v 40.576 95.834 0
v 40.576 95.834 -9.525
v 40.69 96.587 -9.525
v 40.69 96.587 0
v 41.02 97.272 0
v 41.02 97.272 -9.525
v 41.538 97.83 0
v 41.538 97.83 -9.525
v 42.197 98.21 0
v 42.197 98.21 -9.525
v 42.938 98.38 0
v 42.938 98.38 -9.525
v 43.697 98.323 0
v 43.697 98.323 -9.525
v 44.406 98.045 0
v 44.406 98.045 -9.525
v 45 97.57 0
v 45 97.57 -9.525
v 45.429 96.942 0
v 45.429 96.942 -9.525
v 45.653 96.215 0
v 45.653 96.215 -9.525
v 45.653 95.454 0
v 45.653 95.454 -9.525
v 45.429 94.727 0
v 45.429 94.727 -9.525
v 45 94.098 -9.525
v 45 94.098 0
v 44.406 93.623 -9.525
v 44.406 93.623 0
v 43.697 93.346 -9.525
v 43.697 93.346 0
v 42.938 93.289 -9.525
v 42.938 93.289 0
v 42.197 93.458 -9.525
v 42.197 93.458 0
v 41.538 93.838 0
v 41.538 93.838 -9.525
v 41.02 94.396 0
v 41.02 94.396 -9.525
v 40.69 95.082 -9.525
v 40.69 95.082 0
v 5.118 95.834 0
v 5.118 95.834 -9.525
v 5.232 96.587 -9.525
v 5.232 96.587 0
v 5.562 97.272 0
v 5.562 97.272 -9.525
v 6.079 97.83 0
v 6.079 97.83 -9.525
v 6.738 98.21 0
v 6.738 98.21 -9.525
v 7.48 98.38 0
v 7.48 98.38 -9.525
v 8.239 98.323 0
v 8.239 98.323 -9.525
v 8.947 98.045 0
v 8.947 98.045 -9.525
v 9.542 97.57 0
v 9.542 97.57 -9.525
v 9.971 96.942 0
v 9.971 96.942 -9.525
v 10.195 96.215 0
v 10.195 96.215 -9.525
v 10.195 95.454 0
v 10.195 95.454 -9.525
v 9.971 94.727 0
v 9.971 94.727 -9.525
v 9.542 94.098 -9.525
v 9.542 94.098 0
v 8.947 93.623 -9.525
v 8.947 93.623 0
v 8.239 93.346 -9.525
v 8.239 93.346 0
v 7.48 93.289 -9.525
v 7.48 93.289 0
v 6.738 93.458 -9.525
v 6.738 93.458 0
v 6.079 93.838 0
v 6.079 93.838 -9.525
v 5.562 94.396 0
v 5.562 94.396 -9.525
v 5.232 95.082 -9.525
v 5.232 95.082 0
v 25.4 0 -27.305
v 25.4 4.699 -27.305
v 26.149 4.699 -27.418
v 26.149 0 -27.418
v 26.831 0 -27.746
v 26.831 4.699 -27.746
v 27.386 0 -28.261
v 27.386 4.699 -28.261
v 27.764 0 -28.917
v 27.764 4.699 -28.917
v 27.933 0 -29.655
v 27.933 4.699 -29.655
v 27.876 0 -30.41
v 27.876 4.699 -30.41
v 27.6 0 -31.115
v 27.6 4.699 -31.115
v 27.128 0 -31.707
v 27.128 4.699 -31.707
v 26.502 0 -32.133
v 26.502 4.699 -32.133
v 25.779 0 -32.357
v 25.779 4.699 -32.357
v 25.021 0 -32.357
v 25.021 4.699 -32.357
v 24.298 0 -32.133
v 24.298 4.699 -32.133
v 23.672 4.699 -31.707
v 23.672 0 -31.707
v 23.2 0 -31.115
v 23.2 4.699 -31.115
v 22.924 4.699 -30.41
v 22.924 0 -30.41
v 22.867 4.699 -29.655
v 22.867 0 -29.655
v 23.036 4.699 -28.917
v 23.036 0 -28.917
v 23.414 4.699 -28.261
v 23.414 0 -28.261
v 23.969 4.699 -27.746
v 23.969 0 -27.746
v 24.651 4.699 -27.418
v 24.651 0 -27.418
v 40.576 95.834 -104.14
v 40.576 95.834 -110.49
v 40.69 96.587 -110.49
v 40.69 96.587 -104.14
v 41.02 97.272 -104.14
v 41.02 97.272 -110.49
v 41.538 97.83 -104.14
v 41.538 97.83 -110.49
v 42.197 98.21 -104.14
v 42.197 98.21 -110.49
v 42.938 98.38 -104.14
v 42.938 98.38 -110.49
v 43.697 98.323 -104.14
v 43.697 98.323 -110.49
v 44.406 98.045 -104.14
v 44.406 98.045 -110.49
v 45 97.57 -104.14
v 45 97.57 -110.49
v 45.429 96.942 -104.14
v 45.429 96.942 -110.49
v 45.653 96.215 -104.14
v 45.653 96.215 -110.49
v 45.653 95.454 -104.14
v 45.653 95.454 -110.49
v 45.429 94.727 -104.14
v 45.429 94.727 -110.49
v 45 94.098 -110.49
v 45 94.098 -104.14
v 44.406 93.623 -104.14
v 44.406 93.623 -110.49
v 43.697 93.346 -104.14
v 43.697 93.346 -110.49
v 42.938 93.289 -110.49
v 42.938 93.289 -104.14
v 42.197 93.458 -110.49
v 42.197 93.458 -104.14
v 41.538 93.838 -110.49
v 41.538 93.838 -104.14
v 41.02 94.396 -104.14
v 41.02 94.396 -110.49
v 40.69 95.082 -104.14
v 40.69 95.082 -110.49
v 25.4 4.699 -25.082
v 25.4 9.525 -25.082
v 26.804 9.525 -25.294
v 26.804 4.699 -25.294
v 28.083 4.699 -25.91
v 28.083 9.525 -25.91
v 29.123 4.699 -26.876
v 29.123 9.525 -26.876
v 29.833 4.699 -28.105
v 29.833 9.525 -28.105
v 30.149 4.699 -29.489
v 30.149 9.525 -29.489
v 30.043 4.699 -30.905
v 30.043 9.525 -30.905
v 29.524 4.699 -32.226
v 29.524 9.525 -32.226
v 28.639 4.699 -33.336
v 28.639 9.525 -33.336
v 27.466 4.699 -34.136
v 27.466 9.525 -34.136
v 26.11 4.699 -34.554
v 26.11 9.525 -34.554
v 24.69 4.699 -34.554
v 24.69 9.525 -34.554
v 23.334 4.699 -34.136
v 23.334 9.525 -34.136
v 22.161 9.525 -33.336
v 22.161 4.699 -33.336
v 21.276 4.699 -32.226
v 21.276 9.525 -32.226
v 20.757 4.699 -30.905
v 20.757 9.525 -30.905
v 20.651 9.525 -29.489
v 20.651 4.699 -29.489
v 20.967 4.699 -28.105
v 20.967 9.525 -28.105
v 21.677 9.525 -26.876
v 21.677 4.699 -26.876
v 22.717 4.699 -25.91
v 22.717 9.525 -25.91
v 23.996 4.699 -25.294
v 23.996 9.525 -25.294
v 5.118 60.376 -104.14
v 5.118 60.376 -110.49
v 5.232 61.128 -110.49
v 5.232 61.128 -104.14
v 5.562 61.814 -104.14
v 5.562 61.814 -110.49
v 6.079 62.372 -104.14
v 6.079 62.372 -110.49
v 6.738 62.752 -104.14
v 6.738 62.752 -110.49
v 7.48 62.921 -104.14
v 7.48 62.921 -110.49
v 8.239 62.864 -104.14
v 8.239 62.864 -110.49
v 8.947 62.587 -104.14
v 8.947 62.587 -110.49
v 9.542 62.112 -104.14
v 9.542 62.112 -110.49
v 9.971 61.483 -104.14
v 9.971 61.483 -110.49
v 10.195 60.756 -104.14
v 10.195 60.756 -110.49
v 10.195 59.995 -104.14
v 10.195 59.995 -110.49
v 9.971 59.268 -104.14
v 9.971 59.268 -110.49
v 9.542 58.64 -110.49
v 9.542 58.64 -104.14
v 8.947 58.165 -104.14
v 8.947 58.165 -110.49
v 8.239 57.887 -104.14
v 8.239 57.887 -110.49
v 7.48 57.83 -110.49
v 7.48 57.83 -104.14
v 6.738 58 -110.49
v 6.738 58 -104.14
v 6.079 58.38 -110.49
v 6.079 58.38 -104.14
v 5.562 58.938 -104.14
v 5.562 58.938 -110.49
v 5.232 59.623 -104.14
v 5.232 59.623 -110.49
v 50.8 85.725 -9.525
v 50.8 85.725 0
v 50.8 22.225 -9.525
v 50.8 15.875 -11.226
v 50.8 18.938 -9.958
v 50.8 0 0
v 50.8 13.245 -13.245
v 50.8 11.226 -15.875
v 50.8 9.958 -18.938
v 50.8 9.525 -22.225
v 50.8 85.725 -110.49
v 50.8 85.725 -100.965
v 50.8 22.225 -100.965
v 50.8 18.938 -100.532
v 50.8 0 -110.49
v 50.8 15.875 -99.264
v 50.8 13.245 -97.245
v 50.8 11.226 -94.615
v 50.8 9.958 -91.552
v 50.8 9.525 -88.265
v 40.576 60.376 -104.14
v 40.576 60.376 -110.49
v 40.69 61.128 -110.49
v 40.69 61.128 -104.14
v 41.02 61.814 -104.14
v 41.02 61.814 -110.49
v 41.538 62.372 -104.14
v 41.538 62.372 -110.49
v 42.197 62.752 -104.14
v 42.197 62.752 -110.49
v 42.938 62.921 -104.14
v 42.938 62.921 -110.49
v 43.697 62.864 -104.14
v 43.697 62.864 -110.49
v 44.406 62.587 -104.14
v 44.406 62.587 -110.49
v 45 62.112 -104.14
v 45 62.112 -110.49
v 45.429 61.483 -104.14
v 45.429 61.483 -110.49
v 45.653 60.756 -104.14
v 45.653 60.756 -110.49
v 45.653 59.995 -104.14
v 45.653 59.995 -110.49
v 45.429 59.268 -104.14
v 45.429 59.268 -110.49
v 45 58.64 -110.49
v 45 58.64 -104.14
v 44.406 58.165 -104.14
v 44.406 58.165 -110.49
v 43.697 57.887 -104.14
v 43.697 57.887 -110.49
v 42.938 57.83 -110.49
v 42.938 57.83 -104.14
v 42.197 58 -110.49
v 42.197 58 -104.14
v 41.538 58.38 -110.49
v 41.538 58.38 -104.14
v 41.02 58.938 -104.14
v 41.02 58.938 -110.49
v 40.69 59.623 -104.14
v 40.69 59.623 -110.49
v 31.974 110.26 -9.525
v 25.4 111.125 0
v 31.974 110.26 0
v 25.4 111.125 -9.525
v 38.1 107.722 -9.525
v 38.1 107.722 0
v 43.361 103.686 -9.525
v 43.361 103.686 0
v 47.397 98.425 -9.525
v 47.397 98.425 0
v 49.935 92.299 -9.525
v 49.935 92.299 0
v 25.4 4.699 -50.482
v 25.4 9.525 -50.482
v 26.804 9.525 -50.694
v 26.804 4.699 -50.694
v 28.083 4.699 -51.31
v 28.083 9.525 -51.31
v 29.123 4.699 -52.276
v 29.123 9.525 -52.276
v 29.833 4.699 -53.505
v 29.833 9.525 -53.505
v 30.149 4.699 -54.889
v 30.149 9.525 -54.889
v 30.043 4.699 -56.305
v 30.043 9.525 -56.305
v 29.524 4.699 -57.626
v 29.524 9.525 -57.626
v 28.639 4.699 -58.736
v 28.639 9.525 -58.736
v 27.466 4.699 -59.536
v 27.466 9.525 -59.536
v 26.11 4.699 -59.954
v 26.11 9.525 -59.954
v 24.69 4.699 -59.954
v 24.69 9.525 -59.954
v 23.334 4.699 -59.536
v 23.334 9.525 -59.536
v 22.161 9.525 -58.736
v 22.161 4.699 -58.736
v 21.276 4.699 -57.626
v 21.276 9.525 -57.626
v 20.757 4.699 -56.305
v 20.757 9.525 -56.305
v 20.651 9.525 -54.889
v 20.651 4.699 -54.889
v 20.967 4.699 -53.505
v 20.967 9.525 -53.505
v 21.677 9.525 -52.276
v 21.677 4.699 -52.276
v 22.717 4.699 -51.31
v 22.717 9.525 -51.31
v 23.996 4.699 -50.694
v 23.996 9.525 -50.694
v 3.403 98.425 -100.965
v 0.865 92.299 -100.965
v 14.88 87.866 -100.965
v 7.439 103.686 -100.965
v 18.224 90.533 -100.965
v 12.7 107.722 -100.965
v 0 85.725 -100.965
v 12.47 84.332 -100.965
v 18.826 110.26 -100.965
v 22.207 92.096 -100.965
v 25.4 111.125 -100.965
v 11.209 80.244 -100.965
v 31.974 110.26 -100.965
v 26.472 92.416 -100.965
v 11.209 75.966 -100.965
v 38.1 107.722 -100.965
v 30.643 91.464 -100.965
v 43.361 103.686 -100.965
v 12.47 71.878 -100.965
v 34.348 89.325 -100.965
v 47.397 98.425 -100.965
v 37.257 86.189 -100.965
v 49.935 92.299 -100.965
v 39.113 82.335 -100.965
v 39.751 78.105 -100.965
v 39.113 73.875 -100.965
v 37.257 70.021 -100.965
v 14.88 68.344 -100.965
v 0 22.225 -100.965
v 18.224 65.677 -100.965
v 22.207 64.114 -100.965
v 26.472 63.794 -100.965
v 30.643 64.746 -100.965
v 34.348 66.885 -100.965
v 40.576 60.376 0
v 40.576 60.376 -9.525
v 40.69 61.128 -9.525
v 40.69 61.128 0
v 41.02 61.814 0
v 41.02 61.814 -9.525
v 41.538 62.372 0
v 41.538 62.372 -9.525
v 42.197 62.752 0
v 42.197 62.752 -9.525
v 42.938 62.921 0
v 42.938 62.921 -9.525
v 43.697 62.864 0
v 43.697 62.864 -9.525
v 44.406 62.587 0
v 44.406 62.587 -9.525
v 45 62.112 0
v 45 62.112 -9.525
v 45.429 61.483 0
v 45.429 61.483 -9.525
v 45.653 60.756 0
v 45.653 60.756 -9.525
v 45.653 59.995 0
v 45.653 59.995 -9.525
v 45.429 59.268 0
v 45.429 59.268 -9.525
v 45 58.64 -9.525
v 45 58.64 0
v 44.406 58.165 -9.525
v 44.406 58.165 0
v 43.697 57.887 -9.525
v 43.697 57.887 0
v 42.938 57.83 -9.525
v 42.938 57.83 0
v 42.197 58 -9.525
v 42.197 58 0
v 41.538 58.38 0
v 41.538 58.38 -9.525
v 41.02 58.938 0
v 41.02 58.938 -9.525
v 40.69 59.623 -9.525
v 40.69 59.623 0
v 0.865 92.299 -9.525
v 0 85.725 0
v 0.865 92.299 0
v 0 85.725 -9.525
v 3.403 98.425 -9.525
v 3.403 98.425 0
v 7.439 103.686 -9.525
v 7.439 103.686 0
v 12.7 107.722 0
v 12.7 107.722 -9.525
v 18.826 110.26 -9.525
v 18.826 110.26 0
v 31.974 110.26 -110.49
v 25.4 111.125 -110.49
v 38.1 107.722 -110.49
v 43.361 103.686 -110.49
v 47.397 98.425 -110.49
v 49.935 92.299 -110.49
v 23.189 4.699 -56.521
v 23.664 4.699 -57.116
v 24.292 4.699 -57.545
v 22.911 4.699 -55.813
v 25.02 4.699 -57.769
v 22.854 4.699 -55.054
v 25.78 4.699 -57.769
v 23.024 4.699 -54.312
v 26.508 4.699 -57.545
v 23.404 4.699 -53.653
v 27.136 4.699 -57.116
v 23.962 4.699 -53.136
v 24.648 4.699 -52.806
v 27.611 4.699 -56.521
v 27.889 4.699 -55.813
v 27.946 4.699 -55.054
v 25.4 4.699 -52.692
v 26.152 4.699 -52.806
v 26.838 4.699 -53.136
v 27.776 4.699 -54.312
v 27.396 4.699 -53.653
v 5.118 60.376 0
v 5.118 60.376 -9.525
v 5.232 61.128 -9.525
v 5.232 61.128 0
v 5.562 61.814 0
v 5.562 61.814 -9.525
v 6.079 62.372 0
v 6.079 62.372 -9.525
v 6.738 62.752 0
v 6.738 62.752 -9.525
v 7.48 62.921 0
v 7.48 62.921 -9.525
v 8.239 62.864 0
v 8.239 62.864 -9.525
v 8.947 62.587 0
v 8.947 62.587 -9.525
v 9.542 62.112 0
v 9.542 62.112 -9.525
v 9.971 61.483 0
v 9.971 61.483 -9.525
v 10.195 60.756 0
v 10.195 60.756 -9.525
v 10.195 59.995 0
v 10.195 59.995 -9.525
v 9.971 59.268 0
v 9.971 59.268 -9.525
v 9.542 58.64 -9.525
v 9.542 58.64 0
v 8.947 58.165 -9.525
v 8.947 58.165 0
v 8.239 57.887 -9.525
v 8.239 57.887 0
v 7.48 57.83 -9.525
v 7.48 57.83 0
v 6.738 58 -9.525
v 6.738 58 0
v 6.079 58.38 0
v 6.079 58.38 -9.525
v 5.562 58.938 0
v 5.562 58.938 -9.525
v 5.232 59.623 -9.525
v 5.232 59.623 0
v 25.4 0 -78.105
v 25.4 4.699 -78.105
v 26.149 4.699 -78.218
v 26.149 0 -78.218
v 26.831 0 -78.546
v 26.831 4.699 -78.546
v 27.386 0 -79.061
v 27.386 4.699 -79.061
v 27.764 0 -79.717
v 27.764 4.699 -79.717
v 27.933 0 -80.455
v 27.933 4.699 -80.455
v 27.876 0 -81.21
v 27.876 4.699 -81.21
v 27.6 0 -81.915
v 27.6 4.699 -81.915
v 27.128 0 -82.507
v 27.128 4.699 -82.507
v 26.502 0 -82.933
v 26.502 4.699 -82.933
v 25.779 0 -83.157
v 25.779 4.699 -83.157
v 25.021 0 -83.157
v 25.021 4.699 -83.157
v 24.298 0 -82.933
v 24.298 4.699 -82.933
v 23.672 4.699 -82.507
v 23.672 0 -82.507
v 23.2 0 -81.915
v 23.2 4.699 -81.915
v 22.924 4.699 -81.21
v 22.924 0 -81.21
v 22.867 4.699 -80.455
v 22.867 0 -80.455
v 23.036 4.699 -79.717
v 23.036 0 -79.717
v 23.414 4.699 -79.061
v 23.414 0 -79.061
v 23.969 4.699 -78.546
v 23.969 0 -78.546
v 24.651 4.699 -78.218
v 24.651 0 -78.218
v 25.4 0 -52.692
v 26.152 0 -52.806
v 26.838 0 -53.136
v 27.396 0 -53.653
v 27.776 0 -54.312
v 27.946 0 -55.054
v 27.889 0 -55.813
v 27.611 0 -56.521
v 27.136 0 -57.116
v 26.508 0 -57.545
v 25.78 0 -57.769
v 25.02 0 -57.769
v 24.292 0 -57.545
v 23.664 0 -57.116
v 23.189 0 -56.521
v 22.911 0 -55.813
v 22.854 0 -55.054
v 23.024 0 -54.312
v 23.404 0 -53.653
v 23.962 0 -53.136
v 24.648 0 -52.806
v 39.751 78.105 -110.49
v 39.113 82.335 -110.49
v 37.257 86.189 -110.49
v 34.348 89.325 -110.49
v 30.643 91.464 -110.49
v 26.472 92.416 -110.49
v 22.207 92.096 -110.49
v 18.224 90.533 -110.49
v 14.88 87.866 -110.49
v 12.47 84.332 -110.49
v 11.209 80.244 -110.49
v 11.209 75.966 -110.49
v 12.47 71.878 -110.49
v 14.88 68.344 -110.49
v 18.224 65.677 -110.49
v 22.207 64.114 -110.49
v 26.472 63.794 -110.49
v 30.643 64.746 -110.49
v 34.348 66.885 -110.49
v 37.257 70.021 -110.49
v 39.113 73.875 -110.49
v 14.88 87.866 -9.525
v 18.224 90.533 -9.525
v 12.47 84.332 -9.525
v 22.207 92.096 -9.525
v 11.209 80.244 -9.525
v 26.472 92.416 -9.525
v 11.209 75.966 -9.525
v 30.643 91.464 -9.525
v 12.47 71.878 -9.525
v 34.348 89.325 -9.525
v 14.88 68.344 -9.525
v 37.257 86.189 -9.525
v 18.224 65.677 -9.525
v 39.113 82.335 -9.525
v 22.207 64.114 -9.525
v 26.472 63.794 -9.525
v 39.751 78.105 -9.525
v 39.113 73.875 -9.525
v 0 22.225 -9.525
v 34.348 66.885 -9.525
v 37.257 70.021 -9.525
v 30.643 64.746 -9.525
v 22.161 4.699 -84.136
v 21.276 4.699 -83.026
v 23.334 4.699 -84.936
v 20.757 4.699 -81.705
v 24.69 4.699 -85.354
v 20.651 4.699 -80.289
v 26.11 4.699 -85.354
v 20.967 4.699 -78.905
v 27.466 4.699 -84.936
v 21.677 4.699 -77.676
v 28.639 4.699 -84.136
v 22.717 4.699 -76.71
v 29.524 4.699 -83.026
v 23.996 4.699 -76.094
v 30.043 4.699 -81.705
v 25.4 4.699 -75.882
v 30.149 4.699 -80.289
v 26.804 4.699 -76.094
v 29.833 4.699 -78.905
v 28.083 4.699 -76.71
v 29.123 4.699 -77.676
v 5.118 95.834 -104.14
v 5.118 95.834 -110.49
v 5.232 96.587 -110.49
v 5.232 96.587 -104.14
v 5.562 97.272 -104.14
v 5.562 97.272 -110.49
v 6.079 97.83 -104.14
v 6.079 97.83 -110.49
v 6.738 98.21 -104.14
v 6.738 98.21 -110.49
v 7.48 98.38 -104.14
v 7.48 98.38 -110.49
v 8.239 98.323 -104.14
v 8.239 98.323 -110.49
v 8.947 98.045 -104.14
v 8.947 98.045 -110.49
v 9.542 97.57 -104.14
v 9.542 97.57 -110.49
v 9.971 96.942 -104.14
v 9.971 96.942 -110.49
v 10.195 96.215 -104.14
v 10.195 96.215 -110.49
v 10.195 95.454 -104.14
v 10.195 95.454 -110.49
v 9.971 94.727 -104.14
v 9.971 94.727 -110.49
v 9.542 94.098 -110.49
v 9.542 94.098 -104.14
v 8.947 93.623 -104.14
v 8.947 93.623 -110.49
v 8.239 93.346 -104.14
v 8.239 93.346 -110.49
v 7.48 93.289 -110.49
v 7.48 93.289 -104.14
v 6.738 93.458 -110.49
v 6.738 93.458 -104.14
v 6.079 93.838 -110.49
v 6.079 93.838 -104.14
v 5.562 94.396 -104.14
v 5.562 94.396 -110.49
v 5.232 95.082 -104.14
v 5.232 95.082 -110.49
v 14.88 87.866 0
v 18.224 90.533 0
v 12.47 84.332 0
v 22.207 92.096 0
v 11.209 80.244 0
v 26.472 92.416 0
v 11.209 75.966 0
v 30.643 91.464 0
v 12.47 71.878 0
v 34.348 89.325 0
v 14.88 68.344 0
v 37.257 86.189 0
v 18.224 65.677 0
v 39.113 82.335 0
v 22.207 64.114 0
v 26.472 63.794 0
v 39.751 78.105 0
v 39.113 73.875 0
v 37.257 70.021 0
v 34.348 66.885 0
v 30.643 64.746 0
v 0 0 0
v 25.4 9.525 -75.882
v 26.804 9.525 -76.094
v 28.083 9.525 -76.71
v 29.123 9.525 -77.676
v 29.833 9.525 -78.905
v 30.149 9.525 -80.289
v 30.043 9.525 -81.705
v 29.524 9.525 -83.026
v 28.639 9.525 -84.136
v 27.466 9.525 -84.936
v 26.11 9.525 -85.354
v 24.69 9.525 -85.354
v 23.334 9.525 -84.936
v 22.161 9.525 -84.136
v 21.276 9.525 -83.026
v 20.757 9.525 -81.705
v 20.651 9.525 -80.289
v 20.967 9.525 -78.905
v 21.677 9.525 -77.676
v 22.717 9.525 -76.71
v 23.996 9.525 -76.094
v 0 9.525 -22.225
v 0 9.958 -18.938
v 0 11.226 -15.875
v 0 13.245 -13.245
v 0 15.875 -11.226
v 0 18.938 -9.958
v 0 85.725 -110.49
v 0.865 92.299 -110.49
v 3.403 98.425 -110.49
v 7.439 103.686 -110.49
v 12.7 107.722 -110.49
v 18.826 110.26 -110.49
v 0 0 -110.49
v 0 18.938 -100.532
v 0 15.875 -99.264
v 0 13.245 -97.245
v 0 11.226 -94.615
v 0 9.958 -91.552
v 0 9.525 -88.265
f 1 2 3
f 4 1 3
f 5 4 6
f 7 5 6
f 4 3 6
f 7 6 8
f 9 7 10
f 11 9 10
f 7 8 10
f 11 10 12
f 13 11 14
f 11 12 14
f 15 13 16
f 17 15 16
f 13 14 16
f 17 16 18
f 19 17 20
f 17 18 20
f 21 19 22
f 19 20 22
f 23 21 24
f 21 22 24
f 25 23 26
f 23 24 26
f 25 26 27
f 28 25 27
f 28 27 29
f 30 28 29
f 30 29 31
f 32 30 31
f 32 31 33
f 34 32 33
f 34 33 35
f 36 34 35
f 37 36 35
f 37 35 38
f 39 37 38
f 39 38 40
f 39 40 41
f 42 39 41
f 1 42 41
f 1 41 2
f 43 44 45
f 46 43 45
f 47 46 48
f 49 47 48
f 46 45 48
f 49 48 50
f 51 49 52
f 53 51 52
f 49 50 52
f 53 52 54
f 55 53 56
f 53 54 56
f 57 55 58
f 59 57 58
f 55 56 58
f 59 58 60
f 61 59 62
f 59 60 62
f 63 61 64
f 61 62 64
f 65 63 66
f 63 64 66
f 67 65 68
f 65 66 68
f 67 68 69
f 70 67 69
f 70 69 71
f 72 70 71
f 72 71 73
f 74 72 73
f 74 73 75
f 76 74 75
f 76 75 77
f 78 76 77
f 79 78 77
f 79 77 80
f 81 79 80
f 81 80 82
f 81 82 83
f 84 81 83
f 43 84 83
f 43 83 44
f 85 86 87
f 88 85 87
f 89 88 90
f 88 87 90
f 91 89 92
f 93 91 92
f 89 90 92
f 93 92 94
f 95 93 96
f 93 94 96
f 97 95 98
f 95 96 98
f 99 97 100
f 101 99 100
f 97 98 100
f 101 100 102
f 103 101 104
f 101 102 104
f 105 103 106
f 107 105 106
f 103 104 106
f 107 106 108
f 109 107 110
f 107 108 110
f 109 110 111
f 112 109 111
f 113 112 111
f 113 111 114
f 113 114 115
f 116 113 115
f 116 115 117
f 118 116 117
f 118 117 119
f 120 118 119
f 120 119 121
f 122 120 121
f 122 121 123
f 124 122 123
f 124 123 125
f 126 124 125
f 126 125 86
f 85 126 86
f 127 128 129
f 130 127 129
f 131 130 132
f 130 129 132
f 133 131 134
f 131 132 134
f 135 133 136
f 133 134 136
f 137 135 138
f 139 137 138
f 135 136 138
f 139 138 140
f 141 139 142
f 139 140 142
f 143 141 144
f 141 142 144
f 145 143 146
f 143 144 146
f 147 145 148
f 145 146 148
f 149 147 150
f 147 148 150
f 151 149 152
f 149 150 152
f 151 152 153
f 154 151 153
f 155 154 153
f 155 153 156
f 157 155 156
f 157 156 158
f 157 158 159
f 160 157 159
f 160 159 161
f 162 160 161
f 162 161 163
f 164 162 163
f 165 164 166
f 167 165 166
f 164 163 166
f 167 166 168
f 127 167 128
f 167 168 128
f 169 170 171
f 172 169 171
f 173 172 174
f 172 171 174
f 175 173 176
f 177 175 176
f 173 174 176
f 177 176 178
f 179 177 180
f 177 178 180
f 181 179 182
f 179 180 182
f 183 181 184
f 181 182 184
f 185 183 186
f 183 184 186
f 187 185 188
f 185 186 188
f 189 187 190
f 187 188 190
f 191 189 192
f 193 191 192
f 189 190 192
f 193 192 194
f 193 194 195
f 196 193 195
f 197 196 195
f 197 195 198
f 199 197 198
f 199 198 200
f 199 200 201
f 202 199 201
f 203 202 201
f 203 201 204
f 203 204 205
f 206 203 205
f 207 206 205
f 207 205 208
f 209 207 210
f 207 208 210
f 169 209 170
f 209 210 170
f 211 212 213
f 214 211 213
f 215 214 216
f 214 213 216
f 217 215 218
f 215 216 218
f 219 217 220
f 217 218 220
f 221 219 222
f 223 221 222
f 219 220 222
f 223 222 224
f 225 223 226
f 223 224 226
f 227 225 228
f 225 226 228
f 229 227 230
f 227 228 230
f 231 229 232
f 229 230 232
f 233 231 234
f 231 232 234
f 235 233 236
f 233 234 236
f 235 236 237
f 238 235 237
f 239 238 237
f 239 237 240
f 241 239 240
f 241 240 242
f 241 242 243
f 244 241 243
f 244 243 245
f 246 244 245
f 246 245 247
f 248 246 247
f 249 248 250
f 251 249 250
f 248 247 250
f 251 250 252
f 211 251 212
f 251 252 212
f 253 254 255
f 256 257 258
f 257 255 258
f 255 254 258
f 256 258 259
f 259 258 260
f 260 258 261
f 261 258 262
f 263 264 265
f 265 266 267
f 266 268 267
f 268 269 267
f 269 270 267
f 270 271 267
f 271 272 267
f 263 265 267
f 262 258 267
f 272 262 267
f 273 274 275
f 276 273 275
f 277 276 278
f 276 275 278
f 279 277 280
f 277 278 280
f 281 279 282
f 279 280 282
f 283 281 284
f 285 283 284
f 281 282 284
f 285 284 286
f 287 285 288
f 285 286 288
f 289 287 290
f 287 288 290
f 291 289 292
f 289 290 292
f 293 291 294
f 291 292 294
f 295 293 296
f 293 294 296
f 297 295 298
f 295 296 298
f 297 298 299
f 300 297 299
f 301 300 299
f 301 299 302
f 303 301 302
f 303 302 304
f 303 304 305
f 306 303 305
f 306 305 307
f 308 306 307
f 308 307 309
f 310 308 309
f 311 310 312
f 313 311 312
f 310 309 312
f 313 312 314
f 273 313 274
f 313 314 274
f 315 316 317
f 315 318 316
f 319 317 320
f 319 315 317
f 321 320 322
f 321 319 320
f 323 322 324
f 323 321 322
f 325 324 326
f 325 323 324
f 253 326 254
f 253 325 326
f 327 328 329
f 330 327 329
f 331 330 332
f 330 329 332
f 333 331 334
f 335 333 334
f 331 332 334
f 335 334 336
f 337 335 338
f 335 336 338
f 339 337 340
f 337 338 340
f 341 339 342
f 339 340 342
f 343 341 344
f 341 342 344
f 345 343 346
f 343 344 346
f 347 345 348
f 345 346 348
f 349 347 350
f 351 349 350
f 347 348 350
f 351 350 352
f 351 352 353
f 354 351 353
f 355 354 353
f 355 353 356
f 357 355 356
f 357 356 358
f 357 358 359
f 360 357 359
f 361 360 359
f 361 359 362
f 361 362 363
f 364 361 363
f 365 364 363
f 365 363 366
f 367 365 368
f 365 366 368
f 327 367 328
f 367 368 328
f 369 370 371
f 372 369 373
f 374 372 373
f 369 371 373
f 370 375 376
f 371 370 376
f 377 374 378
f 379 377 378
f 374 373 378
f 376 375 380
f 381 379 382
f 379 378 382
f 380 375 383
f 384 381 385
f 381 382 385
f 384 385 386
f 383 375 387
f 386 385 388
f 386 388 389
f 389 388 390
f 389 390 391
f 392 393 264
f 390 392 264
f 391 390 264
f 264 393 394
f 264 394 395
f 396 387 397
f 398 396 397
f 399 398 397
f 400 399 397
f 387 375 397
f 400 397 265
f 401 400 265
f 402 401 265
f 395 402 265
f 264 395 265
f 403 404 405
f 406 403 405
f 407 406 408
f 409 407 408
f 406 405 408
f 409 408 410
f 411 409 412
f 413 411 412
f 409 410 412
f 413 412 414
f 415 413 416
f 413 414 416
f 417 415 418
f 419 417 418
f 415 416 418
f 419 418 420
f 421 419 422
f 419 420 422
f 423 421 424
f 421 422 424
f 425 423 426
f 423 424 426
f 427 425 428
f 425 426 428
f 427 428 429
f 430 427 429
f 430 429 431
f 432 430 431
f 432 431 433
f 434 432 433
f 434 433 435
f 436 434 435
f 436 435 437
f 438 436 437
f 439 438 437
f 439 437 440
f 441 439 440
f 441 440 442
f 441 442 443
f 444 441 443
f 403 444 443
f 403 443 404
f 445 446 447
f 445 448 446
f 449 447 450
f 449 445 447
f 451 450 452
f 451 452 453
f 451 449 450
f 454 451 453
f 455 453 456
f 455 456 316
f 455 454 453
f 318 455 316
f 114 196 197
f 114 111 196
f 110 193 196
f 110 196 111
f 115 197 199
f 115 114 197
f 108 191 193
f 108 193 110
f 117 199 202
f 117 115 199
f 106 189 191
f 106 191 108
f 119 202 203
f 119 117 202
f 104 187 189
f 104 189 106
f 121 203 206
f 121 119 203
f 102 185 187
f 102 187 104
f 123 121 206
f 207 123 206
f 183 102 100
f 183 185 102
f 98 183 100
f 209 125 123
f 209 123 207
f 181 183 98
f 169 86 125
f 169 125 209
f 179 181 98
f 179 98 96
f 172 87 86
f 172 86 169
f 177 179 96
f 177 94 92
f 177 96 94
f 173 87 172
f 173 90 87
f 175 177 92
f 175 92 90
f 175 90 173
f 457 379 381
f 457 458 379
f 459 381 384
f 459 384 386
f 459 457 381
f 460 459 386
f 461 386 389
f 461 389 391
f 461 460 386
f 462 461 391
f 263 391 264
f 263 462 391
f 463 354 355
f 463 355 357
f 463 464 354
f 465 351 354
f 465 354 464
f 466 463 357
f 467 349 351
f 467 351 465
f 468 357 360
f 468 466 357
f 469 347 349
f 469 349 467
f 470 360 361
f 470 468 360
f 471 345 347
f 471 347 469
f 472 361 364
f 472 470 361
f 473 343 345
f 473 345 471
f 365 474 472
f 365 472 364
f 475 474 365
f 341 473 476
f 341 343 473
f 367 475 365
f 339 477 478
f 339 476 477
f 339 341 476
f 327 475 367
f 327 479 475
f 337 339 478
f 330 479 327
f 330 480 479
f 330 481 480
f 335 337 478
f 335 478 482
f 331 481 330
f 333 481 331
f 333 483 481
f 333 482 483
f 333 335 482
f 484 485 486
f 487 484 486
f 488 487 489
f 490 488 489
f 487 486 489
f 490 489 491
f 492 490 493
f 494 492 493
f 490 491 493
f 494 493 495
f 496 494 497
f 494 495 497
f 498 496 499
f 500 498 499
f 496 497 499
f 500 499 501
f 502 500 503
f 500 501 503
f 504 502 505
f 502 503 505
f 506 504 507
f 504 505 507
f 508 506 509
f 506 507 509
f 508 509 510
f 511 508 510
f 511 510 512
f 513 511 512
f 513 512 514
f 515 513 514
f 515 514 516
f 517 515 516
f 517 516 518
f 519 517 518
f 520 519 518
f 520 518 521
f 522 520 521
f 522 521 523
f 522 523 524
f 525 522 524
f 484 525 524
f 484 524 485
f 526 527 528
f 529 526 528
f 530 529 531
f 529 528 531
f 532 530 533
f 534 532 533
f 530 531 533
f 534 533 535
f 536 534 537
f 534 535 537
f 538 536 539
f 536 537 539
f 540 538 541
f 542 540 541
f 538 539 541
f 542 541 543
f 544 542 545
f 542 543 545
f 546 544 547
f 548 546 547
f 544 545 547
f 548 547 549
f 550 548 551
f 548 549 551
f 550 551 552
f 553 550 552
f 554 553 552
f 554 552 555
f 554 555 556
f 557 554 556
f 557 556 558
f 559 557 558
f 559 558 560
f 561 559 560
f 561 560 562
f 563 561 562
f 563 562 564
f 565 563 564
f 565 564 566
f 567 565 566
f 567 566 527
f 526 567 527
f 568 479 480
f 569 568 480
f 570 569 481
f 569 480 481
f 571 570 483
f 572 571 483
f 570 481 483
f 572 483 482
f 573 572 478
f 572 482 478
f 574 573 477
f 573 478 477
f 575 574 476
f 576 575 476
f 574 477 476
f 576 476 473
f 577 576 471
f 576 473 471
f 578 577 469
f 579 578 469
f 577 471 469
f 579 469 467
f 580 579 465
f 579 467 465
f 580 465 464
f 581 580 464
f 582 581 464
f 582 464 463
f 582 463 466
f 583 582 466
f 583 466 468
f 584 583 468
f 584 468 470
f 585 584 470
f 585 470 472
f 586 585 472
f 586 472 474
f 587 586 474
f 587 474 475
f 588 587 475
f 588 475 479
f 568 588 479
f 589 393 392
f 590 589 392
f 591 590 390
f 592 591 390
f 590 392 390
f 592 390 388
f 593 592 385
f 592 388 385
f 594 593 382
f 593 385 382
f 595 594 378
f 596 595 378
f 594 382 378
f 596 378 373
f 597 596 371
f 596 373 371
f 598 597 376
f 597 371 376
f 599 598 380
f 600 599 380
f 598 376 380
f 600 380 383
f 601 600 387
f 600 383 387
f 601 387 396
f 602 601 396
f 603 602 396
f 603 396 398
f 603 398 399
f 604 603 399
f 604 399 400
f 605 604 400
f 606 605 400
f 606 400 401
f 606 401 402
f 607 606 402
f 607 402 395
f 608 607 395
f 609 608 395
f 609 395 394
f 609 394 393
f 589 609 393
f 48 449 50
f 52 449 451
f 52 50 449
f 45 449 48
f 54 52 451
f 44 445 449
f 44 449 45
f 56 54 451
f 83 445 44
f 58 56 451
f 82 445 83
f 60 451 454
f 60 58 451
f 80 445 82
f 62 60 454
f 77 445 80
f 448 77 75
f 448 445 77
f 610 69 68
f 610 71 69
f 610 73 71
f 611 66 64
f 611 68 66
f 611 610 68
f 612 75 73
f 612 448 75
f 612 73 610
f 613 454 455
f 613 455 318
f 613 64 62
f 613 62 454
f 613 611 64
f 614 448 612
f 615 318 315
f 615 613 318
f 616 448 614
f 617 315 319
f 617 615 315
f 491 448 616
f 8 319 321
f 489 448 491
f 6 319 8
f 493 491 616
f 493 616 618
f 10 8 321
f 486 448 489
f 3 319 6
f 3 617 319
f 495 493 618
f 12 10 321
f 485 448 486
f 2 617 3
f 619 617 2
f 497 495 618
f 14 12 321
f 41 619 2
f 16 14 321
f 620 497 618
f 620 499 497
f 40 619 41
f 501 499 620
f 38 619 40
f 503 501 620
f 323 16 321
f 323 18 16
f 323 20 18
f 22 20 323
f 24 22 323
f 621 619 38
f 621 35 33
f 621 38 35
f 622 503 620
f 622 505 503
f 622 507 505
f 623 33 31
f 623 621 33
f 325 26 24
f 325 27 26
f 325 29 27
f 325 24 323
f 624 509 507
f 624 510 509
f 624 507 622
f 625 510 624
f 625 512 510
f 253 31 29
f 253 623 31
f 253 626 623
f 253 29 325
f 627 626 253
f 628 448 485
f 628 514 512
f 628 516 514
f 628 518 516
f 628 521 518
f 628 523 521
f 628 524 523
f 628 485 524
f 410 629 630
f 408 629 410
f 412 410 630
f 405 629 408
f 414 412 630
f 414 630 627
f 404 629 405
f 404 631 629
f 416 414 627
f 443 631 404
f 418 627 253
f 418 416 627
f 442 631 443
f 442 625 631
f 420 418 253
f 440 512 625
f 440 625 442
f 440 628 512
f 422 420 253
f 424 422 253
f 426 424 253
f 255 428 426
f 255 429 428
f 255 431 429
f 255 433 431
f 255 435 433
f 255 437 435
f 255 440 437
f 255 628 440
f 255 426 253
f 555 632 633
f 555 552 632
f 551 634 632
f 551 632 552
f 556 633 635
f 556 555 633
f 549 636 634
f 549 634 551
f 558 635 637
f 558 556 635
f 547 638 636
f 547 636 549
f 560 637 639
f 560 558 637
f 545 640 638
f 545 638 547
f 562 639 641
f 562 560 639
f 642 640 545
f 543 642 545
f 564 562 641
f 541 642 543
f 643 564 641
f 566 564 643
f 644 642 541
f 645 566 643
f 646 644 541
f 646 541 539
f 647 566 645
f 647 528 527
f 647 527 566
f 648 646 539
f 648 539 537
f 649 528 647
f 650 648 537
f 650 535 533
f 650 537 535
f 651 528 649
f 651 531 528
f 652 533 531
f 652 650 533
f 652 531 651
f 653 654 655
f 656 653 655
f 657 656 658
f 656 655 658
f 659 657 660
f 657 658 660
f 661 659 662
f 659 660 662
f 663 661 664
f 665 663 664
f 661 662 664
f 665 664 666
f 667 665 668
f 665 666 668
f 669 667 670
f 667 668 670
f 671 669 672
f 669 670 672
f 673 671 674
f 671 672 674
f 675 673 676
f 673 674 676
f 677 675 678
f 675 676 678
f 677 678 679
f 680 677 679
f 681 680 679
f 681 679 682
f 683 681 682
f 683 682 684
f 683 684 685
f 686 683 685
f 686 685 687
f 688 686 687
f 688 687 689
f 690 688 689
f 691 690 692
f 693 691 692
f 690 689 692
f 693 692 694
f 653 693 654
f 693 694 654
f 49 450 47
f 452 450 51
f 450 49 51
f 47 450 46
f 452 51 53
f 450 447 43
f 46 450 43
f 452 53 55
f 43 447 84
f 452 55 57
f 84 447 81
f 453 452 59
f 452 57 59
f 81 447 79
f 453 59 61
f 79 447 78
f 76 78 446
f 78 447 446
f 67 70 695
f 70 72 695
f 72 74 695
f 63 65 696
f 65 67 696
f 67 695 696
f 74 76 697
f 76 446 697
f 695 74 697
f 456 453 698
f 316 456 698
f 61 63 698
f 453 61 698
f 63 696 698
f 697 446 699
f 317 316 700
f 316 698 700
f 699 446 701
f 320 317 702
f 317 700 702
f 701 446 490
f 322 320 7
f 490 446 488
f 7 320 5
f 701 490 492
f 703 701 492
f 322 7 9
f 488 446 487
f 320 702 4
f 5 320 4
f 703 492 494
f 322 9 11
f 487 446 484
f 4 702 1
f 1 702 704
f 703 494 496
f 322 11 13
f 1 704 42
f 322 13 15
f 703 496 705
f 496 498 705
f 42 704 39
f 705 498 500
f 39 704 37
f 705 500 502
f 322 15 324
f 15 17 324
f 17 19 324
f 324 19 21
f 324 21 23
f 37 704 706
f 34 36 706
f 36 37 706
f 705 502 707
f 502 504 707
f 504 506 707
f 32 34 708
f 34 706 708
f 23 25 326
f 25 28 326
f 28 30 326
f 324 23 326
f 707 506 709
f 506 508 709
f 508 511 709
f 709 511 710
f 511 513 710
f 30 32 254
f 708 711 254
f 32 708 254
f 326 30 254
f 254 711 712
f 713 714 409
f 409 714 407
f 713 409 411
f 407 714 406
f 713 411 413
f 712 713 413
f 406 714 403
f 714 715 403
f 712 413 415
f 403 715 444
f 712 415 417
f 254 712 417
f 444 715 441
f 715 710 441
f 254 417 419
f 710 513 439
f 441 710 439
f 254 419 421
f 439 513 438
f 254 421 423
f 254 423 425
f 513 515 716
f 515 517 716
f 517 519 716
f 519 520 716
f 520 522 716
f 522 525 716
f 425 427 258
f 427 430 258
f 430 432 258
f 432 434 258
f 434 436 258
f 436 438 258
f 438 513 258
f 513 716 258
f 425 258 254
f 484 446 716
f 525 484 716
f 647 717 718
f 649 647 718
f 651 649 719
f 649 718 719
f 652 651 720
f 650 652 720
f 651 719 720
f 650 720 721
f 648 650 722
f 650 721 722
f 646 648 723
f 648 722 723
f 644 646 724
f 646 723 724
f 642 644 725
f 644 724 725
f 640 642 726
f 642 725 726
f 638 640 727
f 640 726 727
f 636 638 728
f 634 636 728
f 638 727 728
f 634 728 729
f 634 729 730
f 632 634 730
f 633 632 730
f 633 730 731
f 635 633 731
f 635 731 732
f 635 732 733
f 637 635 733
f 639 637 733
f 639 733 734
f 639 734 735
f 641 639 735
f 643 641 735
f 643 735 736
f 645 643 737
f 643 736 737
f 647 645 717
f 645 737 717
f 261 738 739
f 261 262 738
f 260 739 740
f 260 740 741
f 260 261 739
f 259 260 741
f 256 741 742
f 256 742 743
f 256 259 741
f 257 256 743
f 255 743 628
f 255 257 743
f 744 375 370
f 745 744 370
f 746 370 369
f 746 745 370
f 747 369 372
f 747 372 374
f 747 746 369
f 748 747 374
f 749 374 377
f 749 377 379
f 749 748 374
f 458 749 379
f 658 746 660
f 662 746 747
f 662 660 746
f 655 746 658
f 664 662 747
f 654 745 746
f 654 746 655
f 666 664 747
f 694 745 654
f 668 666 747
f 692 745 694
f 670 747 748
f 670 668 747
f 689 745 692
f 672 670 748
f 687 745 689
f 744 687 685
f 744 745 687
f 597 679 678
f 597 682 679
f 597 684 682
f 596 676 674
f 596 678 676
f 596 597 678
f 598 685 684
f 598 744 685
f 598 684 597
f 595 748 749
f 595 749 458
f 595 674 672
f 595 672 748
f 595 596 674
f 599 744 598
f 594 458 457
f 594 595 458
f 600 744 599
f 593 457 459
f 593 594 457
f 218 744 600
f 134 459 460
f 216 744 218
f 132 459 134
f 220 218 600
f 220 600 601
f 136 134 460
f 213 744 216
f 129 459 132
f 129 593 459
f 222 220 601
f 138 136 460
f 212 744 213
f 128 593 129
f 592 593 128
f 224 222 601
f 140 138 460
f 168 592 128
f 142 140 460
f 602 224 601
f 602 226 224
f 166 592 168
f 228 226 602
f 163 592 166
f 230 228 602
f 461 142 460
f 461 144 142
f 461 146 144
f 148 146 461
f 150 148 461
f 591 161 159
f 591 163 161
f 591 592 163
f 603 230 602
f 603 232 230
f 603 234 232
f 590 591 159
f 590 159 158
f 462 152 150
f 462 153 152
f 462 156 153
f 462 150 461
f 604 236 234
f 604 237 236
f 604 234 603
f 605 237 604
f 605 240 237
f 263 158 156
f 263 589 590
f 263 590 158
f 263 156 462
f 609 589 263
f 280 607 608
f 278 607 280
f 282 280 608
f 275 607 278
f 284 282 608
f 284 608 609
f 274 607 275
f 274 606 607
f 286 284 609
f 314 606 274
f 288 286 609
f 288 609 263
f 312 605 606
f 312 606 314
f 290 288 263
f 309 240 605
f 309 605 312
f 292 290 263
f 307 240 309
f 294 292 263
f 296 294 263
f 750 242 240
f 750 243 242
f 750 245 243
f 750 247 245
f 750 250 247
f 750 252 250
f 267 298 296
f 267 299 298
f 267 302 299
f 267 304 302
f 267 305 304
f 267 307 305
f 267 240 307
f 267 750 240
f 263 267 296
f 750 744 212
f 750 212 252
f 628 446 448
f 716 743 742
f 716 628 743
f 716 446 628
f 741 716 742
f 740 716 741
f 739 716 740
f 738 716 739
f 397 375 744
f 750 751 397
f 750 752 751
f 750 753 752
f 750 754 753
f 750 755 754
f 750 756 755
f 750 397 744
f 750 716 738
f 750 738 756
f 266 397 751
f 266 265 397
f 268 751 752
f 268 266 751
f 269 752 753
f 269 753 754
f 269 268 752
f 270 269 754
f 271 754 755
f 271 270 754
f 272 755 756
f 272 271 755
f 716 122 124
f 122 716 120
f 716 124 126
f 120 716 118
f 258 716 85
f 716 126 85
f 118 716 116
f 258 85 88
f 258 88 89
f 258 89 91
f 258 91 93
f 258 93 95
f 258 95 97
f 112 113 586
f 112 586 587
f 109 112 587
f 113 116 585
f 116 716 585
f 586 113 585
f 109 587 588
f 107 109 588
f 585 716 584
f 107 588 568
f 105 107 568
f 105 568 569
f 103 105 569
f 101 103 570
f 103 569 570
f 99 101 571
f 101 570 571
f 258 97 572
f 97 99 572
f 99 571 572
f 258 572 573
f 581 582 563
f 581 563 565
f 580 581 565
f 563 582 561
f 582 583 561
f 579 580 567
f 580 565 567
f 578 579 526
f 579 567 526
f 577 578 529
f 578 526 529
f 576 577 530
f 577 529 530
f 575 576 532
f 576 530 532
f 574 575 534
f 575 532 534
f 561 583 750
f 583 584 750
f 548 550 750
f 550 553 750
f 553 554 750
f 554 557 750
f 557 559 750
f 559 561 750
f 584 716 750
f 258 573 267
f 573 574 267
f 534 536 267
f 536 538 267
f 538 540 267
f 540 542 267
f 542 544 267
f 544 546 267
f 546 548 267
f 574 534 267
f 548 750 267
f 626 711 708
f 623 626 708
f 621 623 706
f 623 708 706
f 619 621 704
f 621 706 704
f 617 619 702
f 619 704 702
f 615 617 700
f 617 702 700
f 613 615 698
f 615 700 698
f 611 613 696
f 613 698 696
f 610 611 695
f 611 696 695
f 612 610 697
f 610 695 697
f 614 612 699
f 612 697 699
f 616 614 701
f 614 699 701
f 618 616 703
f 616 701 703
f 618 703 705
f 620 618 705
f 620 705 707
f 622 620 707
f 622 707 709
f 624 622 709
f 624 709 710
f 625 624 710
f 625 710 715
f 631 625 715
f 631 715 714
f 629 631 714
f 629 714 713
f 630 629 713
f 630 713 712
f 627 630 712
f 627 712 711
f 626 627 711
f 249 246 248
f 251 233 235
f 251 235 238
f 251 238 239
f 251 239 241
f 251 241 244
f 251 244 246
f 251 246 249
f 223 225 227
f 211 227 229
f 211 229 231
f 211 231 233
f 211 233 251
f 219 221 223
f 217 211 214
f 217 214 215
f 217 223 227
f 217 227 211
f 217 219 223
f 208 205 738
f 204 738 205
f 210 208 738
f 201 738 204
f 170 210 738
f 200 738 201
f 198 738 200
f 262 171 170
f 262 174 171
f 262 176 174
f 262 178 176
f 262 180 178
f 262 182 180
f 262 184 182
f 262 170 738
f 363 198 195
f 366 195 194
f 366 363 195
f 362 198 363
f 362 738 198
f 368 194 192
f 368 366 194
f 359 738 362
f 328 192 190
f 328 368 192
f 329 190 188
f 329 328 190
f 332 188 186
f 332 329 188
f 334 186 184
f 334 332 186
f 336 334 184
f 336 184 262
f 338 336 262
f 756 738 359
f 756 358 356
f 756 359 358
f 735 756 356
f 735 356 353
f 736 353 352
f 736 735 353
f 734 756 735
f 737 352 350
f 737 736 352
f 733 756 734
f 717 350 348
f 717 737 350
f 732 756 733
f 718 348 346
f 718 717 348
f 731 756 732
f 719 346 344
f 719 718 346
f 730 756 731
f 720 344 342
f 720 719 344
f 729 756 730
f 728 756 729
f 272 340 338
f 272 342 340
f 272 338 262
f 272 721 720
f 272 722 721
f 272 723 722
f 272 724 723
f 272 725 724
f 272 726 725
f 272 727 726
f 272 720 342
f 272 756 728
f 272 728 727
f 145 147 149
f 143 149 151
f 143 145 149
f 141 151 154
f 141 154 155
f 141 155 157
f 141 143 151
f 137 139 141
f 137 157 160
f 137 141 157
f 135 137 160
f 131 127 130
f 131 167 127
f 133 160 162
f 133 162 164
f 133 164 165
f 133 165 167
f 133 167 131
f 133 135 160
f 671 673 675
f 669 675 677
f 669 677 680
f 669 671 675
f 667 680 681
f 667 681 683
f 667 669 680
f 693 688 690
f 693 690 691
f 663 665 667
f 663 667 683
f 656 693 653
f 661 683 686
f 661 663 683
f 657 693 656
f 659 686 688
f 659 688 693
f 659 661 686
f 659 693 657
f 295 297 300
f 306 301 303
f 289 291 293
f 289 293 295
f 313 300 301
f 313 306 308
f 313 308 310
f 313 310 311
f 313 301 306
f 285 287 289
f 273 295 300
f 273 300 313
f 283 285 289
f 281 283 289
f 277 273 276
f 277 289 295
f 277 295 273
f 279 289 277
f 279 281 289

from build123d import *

# Parameters (mm, degrees)
SKETCH1_W           = 50.8
SKETCH1_H           = 110.49
BOSS_EXTRUDE1_DEPTH = 9.525
SKETCH2_W           = 50.8
SKETCH2_H           = 9.525
BOSS_EXTRUDE2_DEPTH = 101.6
SKETCH3_W           = 50.8
SKETCH3_H           = 9.525
BOSS_EXTRUDE3_DEPTH = 101.6
SKETCH8_R           = 14.351
CUT_EXTRUDE7_DEPTH  = 165.734470361
SKETCH9_R           = 2.5527
CUT_EXTRUDE8_DEPTH  = 159.503428512
SKETCH10_R          = 2.5527
CUT_EXTRUDE9_DEPTH  = 6.35
FILLET5_R           = 25.4
FILLET6_R           = 25.4
FILLET7_R           = 25.4
FILLET8_R           = 25.4
SKETCH11_R          = 2.5527
CUT_EXTRUDE10_DEPTH = 159.465264648
SKETCH12_R          = 2.54
CUT_EXTRUDE11_DEPTH = 159.465264648
FILLET9_R           = 12.7
SKETCH13_R          = 4.7625
CUT_EXTRUDE12_DEPTH = 4.826


with BuildPart() as part:
    # Sketch1 → Boss-Extrude1 (new body)
    with BuildSketch(Plane(origin=(0, 0, 0), x_dir=(1, 0, 0), z_dir=(0, 1, 0))):
        with Locations((25.4, 55.245)):
            Rectangle(SKETCH1_W, SKETCH1_H)
    extrude(amount=BOSS_EXTRUDE1_DEPTH)

    # Sketch2 → Boss-Extrude2 (add)
    with BuildSketch(Plane(origin=(0, 9.525, 0), x_dir=(1, 0, 0), z_dir=(0, 1, 0))):
        with Locations((25.4, 105.7275)):
            Rectangle(SKETCH2_W, SKETCH2_H)
    extrude(amount=BOSS_EXTRUDE2_DEPTH)

    # Sketch3 → Boss-Extrude3 (add)
    with BuildSketch(Plane(origin=(0, 9.525, 0), x_dir=(1, 0, 0), z_dir=(0, 1, 0))):
        with Locations((25.4, 4.7625)):
            Rectangle(SKETCH3_W, SKETCH3_H)
    extrude(amount=BOSS_EXTRUDE3_DEPTH)

    # Sketch8 → Cut-Extrude7 (cut, through all)
    with BuildSketch(Plane.XY):
        with Locations((25.4, 78.105)):
            Circle(SKETCH8_R)
    extrude(amount=-CUT_EXTRUDE7_DEPTH, mode=Mode.SUBTRACT)

    # Sketch9 → Cut-Extrude8 (cut, through all)
    with BuildSketch(Plane(origin=(0, 0, -9.525), x_dir=(-1, 0, 0), z_dir=(0, 0, -1))):
        with Locations((-43.1292, 95.8342)):
            Circle(SKETCH9_R)
        with Locations((-7.6708, 95.8342)):
            Circle(SKETCH9_R)
        with Locations((-7.6708, 60.3758)):
            Circle(SKETCH9_R)
        with Locations((-43.1292, 60.3758)):
            Circle(SKETCH9_R)
    extrude(amount=-CUT_EXTRUDE8_DEPTH, mode=Mode.SUBTRACT)

    # Sketch10 → Cut-Extrude9 (cut)
    with BuildSketch(Plane(origin=(0, 0, -110.49), x_dir=(-1, 0, 0), z_dir=(0, 0, -1))):
        with Locations((-43.1292, 95.8342)):
            Circle(SKETCH10_R)
        with Locations((-7.6708, 95.8342)):
            Circle(SKETCH10_R)
        with Locations((-7.6708, 60.3758)):
            Circle(SKETCH10_R)
        with Locations((-43.1292, 60.3758)):
            Circle(SKETCH10_R)
    extrude(amount=-CUT_EXTRUDE9_DEPTH, mode=Mode.SUBTRACT)

    # Fillet5
    fillet5_edges = [part.edges().sort_by_distance(p)[0] for p in [
        (0, 111.125, -4.7625),
    ]]
    fillet(fillet5_edges, radius=FILLET5_R)

    # Fillet6
    fillet6_edges = [part.edges().sort_by_distance(p)[0] for p in [
        (50.8, 111.125, -4.7625),
    ]]
    fillet(fillet6_edges, radius=FILLET6_R - 0.0001)  # a hair under: the kernel refuses the full size

    # Fillet7
    fillet7_edges = [part.edges().sort_by_distance(p)[0] for p in [
        (0, 111.125, -105.7275),
    ]]
    fillet(fillet7_edges, radius=FILLET7_R)

    # Fillet8
    fillet8_edges = [part.edges().sort_by_distance(p)[0] for p in [
        (50.8, 111.125, -105.7275),
    ]]
    fillet(fillet8_edges, radius=FILLET8_R - 0.0001)  # a hair under: the kernel refuses the full size

    # Sketch11 → Cut-Extrude10 (cut, through all)
    with BuildSketch(Plane(origin=(0, 9.525, 0), x_dir=(1, 0, 0), z_dir=(0, 1, 0))):
        with Locations(Location((25.4, 55.245, 0), (0, 0, 270))):
            Circle(SKETCH11_R)
    extrude(amount=-CUT_EXTRUDE10_DEPTH, mode=Mode.SUBTRACT)

    # Sketch12 → Cut-Extrude11 (cut, through all)
    with BuildSketch(Plane(origin=(0, 9.525, 0), x_dir=(1, 0, 0), z_dir=(0, 1, 0))):
        with Locations(Location((25.4, 29.845, 0), (0, 0, 270))):
            Circle(SKETCH12_R)
        with Locations(Location((25.4, 80.645, 0), (0, 0, 270))):
            Circle(SKETCH12_R)
    extrude(amount=-CUT_EXTRUDE11_DEPTH, mode=Mode.SUBTRACT)

    # Fillet9
    fillet9_edges = [part.edges().sort_by_distance(p)[0] for p in [
        (25.4, 9.525, -100.965),
        (25.4, 9.525, -9.525),
    ]]
    fillet(fillet9_edges, radius=FILLET9_R)

    # Sketch13 → Cut-Extrude12 (cut)
    with BuildSketch(Plane(origin=(0, 9.525, 0), x_dir=(1, 0, 0), z_dir=(0, 1, 0))):
        with Locations(Location((25.4, 55.245, 0), (0, 0, 270))):
            Circle(SKETCH13_R)
        with Locations(Location((25.4, 29.845, 0), (0, 0, 270))):
            Circle(SKETCH13_R)
        with Locations(Location((25.4, 80.645, 0), (0, 0, 270))):
            Circle(SKETCH13_R)
    extrude(amount=-CUT_EXTRUDE12_DEPTH, mode=Mode.SUBTRACT)


solid = part.part
